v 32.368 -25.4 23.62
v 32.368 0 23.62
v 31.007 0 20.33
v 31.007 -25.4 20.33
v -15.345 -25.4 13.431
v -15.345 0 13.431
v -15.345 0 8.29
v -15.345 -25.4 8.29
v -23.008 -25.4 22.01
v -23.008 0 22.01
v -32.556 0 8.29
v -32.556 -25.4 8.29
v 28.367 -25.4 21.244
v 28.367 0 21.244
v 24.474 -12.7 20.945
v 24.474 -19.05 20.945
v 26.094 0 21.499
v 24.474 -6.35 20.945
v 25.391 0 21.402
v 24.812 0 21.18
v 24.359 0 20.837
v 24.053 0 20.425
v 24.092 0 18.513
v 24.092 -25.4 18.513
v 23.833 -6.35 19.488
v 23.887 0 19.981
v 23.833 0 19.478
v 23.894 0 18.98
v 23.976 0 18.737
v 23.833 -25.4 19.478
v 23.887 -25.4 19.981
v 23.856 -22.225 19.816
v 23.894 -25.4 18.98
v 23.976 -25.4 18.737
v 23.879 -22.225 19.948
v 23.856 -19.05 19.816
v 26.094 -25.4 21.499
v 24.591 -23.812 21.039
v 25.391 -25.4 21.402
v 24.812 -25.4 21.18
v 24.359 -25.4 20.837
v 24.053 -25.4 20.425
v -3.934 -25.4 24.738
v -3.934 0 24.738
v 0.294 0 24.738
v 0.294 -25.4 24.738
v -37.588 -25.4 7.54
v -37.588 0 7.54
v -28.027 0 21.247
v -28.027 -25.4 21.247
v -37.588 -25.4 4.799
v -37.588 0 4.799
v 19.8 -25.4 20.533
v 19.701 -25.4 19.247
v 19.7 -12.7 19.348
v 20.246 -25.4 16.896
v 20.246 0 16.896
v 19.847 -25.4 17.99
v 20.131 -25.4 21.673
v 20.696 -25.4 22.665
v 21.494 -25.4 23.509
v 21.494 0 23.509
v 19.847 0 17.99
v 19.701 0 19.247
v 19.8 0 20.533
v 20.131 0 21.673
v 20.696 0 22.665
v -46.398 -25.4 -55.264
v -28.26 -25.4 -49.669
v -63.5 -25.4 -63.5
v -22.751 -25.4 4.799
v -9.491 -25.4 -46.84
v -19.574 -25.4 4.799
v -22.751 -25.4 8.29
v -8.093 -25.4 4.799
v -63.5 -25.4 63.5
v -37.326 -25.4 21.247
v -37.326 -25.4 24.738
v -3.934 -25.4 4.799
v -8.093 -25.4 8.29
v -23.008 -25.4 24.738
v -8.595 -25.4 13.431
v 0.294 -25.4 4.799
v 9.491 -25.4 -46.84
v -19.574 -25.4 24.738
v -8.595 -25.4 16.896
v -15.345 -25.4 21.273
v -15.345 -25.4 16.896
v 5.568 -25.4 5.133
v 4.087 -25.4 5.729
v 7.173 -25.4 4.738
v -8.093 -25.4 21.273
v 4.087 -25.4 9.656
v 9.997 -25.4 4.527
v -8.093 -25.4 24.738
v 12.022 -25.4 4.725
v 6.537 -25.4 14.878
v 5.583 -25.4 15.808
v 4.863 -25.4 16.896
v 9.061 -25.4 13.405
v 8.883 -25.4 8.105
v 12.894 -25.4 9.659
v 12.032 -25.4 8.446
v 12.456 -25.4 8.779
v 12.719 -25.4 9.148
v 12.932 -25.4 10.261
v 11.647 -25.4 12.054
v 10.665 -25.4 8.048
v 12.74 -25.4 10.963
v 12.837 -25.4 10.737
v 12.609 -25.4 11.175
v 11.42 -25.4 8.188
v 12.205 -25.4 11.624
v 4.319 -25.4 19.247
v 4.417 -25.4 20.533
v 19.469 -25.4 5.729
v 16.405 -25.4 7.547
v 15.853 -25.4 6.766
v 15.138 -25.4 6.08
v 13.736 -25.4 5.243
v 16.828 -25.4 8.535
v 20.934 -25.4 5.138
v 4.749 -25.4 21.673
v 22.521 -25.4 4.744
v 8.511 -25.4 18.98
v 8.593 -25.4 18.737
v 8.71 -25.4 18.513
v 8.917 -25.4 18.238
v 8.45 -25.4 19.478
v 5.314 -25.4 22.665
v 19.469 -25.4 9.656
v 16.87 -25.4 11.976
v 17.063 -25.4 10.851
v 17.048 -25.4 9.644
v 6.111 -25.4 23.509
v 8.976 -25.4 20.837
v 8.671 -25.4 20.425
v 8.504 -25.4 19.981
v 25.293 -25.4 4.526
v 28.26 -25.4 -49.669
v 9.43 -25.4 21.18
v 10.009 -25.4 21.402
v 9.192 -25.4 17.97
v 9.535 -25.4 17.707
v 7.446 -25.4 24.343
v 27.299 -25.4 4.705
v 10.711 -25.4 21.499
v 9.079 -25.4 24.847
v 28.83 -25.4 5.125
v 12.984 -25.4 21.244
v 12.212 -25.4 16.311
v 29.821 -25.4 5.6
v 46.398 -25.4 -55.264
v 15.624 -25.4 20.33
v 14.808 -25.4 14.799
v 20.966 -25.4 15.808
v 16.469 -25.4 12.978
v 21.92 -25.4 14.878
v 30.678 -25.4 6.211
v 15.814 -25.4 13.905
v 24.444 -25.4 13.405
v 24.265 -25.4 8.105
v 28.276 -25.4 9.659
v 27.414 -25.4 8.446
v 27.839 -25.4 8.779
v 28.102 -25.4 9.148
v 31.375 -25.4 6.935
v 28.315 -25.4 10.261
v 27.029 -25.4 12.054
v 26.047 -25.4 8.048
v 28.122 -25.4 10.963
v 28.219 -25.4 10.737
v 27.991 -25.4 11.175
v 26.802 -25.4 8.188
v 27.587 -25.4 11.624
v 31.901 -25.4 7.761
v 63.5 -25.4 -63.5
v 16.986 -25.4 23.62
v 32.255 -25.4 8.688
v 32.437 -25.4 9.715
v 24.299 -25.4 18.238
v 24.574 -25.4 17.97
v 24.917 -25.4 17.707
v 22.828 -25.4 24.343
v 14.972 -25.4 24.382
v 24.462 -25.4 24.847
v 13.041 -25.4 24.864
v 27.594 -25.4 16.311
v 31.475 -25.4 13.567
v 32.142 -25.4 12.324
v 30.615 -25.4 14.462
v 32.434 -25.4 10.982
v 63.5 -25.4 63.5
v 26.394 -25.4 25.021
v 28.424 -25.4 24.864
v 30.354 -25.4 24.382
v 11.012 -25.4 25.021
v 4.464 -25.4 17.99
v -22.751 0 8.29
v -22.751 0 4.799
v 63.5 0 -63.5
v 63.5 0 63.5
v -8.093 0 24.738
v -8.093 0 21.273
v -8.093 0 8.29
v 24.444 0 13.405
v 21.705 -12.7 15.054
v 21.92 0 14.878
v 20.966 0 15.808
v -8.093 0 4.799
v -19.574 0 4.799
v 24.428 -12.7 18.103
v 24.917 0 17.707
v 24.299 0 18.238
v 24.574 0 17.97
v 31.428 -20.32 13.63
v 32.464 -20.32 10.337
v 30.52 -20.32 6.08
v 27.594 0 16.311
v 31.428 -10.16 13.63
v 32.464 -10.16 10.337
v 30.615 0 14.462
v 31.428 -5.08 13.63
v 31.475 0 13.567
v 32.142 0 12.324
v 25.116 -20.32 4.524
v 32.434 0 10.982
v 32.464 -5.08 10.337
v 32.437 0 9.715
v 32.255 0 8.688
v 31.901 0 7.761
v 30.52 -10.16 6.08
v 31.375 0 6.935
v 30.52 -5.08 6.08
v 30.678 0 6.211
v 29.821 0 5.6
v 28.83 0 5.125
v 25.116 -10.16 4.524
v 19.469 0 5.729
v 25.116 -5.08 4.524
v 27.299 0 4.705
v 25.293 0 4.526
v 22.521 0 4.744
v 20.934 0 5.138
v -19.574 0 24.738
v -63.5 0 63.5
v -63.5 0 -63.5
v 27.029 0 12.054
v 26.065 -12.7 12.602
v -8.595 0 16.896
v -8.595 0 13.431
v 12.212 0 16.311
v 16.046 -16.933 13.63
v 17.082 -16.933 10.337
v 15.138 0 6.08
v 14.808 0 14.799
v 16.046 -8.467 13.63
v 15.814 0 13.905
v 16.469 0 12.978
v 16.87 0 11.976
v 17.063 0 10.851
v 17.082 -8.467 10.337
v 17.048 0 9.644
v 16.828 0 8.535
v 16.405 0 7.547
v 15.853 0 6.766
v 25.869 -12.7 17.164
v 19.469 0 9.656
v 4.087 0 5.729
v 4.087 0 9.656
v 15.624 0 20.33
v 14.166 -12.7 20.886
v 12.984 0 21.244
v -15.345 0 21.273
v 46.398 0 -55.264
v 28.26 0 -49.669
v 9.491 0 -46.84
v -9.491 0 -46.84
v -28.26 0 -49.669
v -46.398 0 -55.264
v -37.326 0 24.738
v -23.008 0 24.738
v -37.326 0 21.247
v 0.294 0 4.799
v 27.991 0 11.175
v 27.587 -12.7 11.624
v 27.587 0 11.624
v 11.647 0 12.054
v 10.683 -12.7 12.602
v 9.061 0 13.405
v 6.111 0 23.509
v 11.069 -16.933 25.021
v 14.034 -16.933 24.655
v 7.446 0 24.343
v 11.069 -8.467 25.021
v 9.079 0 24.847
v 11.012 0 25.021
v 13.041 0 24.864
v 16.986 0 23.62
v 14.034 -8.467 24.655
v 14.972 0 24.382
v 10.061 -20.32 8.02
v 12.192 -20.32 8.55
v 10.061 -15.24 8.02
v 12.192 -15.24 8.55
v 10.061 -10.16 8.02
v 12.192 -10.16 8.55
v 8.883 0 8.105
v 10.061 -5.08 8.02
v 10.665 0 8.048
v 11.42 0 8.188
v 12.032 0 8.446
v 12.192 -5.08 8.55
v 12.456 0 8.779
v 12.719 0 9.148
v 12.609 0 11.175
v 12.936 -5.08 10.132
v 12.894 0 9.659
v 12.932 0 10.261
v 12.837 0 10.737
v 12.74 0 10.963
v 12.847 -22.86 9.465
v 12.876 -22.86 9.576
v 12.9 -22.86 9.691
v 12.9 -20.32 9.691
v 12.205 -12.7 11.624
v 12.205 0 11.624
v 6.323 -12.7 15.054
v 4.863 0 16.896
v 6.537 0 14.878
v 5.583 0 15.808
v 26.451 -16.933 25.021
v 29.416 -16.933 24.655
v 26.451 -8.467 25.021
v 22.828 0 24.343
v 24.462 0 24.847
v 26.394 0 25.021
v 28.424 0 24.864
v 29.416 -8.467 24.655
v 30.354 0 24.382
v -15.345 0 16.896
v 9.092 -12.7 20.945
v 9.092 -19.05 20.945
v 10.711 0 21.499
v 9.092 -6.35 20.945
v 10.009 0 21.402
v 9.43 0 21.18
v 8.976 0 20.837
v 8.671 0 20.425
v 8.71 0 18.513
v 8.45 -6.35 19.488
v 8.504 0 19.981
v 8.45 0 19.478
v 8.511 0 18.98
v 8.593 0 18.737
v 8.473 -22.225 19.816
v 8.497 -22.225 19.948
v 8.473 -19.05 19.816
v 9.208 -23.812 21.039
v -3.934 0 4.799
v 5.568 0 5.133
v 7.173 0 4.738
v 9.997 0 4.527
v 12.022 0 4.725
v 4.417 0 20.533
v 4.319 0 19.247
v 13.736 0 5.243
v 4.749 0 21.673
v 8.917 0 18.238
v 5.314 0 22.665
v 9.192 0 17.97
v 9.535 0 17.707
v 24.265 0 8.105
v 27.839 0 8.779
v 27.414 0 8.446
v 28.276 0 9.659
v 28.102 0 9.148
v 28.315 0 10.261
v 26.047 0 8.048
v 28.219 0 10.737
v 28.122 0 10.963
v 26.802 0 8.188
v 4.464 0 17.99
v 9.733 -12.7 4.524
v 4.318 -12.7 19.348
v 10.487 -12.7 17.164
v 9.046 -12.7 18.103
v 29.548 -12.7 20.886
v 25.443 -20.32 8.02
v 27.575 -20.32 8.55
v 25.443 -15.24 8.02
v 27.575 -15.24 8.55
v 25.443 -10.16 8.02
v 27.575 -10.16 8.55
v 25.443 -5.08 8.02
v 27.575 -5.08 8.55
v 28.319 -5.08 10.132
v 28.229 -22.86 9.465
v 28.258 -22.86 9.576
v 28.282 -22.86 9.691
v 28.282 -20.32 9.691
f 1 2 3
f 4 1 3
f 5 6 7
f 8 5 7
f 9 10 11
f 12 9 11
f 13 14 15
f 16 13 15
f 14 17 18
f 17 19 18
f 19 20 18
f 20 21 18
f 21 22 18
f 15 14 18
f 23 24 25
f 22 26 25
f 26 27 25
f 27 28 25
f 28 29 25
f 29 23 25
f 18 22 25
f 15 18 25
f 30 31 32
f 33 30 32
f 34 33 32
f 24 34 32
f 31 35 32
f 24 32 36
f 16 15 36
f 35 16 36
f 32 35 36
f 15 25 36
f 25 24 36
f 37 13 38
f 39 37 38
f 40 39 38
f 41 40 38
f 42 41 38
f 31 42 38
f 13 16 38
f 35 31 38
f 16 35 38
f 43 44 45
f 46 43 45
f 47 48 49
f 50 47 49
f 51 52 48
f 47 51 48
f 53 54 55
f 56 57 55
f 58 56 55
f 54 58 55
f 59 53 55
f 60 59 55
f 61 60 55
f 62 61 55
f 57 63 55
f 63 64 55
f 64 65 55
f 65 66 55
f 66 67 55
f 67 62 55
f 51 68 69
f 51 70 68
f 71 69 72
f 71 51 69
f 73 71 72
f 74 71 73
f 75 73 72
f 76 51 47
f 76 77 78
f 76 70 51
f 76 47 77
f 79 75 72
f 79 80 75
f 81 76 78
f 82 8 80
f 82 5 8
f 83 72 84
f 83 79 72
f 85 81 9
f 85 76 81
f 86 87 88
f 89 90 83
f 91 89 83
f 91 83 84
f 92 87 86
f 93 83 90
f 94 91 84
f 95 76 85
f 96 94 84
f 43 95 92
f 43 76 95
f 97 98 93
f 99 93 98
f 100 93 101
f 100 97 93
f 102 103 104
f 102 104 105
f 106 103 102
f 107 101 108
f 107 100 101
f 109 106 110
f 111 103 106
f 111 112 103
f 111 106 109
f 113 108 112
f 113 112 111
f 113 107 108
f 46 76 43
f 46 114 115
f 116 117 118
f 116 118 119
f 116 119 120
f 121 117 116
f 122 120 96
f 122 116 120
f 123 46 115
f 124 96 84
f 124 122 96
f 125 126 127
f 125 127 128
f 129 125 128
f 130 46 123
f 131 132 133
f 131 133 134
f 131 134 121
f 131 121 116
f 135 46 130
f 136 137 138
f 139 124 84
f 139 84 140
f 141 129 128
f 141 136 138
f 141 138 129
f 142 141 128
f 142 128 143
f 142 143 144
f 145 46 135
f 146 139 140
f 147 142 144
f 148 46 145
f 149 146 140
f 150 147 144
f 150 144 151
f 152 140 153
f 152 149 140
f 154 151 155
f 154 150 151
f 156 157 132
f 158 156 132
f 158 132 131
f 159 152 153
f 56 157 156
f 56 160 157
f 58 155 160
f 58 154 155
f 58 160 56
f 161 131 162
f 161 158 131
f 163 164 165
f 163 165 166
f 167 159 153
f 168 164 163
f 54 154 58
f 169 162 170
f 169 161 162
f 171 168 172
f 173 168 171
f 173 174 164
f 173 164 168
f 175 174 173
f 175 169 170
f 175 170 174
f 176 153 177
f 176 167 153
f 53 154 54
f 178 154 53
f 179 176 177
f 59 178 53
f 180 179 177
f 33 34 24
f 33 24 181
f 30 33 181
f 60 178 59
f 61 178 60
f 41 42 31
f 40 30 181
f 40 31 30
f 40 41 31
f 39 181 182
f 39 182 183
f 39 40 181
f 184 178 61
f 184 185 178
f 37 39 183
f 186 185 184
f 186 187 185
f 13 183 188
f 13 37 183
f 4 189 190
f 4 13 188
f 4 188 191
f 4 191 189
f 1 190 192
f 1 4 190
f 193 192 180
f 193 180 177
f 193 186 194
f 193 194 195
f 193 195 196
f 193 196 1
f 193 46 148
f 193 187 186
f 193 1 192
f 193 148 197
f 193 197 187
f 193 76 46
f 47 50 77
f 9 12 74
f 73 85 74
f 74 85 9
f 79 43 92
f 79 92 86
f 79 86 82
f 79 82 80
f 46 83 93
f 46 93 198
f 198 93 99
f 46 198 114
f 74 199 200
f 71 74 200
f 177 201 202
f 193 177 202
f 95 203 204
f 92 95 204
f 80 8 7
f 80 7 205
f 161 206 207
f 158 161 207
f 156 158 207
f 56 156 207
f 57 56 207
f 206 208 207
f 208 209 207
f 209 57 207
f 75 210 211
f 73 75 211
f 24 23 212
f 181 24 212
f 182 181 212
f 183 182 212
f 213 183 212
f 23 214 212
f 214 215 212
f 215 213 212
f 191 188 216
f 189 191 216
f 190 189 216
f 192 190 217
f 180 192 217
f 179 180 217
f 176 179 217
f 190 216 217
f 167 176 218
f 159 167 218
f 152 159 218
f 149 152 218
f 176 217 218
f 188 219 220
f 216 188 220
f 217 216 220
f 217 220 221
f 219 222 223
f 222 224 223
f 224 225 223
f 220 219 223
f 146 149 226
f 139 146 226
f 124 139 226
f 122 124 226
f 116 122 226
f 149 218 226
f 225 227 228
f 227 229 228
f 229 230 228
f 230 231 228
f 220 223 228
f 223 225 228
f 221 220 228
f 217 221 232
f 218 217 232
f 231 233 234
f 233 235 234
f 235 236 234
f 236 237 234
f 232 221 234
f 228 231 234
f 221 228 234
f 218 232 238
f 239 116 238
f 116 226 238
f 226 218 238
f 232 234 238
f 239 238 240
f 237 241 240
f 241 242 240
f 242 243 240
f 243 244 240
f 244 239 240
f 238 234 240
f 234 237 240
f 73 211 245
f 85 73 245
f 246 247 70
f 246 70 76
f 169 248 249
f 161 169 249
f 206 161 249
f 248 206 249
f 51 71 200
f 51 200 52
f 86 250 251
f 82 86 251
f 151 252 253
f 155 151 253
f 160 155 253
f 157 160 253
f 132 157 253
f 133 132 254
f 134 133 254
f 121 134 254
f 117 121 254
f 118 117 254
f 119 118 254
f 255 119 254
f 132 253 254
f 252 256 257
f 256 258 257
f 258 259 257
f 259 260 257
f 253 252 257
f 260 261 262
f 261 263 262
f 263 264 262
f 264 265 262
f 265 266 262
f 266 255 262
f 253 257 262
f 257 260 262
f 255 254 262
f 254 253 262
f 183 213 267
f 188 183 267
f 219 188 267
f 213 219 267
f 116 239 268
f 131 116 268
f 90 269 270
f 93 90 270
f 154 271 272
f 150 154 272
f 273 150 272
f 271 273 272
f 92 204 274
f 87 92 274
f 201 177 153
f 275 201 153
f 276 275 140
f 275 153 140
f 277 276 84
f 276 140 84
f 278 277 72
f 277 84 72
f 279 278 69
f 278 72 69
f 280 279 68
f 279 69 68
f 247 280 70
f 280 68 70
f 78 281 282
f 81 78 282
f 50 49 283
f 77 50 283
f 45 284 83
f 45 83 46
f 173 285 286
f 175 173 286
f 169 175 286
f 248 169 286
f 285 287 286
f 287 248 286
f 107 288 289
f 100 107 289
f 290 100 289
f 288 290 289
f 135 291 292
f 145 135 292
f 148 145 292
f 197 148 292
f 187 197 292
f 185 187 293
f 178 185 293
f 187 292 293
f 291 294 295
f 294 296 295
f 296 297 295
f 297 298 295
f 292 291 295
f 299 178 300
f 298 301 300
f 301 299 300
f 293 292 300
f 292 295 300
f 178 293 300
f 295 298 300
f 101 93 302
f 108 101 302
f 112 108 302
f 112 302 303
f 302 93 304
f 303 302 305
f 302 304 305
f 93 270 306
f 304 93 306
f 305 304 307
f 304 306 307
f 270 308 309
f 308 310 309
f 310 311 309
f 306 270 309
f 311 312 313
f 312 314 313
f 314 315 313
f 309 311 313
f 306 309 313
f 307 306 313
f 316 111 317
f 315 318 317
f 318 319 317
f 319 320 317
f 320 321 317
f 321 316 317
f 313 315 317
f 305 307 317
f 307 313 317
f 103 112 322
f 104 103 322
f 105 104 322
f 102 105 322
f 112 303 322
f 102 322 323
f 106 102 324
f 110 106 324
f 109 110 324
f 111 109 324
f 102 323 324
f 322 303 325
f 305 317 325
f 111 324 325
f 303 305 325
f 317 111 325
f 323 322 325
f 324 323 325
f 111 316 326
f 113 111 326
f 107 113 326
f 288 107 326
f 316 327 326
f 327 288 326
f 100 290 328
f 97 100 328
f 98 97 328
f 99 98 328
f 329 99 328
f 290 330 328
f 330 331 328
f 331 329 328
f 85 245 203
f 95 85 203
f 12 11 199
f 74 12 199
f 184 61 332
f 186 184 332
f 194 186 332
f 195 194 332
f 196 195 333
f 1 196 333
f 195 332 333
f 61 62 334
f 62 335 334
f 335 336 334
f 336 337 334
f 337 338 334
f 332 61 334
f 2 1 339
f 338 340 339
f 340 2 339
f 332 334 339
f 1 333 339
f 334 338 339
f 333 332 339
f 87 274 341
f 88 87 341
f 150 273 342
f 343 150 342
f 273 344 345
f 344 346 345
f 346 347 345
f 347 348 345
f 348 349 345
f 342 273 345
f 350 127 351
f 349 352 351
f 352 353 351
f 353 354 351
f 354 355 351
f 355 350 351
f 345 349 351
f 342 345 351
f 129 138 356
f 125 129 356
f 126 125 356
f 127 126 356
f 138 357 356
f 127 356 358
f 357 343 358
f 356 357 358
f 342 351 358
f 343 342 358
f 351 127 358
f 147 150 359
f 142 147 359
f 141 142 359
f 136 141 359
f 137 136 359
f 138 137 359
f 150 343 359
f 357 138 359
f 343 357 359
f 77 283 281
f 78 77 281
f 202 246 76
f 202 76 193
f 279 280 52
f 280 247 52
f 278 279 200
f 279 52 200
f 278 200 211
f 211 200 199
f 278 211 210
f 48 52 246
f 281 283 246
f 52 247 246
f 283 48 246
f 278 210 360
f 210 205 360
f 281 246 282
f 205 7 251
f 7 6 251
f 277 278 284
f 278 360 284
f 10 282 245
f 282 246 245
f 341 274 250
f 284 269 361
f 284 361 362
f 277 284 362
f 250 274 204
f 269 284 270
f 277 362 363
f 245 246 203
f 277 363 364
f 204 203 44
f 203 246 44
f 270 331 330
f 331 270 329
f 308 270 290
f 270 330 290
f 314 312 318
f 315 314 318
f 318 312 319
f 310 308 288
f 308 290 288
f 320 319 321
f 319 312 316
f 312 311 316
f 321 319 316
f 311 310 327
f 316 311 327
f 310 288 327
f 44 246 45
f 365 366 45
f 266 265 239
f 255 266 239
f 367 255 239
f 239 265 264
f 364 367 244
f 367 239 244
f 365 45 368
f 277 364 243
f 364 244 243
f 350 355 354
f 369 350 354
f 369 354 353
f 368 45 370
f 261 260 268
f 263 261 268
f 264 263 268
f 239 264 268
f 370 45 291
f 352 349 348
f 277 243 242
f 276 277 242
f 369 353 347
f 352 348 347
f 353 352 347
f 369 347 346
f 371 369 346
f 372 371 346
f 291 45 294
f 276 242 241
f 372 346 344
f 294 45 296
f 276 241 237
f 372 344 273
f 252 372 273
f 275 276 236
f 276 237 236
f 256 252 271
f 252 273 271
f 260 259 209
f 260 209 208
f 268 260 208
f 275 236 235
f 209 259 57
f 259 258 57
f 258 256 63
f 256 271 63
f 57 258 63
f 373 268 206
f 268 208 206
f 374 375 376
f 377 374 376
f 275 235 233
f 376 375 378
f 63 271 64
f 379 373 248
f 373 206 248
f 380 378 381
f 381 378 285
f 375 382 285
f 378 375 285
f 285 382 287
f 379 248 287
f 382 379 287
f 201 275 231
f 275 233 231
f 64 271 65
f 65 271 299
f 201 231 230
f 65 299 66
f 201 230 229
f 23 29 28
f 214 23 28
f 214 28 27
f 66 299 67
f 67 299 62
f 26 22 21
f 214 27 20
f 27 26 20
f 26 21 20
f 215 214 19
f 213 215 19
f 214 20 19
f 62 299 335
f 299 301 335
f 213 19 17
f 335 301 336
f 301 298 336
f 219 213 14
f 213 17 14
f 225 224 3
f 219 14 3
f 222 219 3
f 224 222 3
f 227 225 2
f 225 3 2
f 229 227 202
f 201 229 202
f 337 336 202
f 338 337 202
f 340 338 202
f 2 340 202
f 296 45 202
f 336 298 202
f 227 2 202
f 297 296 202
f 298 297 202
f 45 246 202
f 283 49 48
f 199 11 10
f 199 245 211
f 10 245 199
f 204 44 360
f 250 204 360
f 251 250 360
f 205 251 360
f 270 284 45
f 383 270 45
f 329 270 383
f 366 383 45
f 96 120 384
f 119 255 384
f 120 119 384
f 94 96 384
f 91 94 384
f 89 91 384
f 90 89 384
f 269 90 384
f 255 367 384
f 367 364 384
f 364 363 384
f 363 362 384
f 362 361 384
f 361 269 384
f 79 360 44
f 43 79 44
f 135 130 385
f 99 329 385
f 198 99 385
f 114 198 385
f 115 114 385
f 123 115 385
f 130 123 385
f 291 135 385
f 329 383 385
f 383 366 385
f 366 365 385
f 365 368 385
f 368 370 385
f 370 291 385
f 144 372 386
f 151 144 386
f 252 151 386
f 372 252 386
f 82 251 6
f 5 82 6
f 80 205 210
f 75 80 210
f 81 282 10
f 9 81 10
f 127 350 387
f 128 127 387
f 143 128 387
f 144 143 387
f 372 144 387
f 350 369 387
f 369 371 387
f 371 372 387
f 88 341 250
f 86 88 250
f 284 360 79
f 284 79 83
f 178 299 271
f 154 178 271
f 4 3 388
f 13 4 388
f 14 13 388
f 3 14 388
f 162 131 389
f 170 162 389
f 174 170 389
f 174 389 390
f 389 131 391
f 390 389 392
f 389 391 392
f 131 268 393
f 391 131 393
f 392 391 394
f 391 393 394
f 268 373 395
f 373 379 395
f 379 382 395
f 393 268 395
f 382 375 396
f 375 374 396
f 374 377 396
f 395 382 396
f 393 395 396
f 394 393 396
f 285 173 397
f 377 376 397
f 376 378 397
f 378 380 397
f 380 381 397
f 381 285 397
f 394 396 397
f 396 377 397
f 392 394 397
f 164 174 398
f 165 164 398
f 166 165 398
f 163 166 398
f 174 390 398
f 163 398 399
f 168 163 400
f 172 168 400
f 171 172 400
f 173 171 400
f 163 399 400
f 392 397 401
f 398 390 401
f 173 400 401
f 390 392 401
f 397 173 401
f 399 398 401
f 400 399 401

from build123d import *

# Parameters (mm, degrees)
F0_W     = 127
F0_H     = 127
F0_W_2   = 4.2285097079
F0_H_2   = 19.9381432976
F1_DEPTH = 25.4
F3_DEPTH = 25.4


with BuildPart() as f1:
    # F0 (on Front) → F1 (new body)
    with BuildSketch(Plane.XZ):
        Rectangle(F0_W, F0_H)
        Polygon((-22.7507378271, 8.2904180357), (-22.7507378271, 4.7993883491), (-37.5876139951, 4.7993883491), (-37.5876139951, 7.539846653), (-28.0265564409, 21.2465019601), (-37.3257867686, 21.2465019601), (-37.3257867686, 24.7375316467), (-23.0082012664, 24.7375316467), (-23.0082012664, 22.010164704), (-32.5561674593, 8.2904180357), align=None, mode=Mode.SUBTRACT)
        Polygon((-8.0927769304, 8.2904180357), (-8.0927769304, 4.7993883491), (-19.5739008122, 4.7993883491), (-19.5739008122, 24.7375316467), (-8.0927769304, 24.7375316467), (-8.0927769304, 21.2726846827), (-15.3453911043, 21.2726846827), (-15.3453911043, 16.8958062131), (-8.5946124479, 16.8958062131), (-8.5946124479, 13.4309592492), (-15.3453911043, 13.4309592492), (-15.3453911043, 8.2904180357), align=None, mode=Mode.SUBTRACT)
        with Locations((-1.8198329623, 14.7684599979)):
            Rectangle(F0_W_2, F0_H_2, mode=Mode.SUBTRACT)
        with BuildLine():
            add(Edge.make_bspline(
                [(16.0455114589, 13.6295115626), (17.0819108971, 12.2876470268), (17.0819108971, 10.3370341894)],
                knots=[0, 0, 0, 1, 1, 1], degree=2))
            add(Edge.make_bspline(
                [(17.0819108971, 10.3370341894), (17.0819108971, 7.6358499694), (15.1378437404, 6.0801598653)],
                knots=[0, 0, 0, 1, 1, 1], degree=2))
            add(Edge.make_bspline(
                [(15.1378437404, 6.0801598653), (13.1937765836, 4.5244697612), (9.7332934068, 4.5244697612)],
                knots=[0, 0, 0, 1, 1, 1], degree=2))
            add(Edge.make_bspline(
                [(9.7332934068, 4.5244697612), (6.5390012436, 4.5244697612), (4.0865528887, 5.7288750031)],
                knots=[0, 0, 0, 1, 1, 1], degree=2))
            Line((4.0865528887, 5.7288750031), (4.0865528887, 9.6562834005))
            add(Edge.make_bspline(
                [(4.0865528887, 9.6562834005), (6.1026225327, 8.7529794691), (7.5012163009, 8.386421352)],
                knots=[0, 0, 0, 1, 1, 1], degree=2))
            add(Edge.make_bspline(
                [(7.5012163009, 8.386421352), (8.8998100691, 8.0198632349), (10.0605774399, 8.0198632349)],
                knots=[0, 0, 0, 1, 1, 1], degree=2))
            add(Edge.make_bspline(
                [(10.0605774399, 8.0198632349), (11.4482617403, 8.0198632349), (12.1922874423, 8.5500633686)],
                knots=[0, 0, 0, 1, 1, 1], degree=2))
            add(Edge.make_bspline(
                [(12.1922874423, 8.5500633686), (12.9363131443, 9.0802635023), (12.9363131443, 10.1319361953)],
                knots=[0, 0, 0, 1, 1, 1], degree=2))
            add(Edge.make_bspline(
                [(12.9363131443, 10.1319361953), (12.9363131443, 10.7166836679), (12.6090291111, 11.1748813142)],
                knots=[0, 0, 0, 1, 1, 1], degree=2))
            add(Edge.make_bspline(
                [(12.6090291111, 11.1748813142), (12.281745078, 11.6330789606), (11.6468140538, 12.0541844165)],
                knots=[0, 0, 0, 1, 1, 1], degree=2))
            add(Edge.make_bspline(
                [(11.6468140538, 12.0541844165), (11.0118830295, 12.4752898725), (9.0612701921, 13.4047765265)],
                knots=[0, 0, 0, 1, 1, 1], degree=2))
            add(Edge.make_bspline(
                [(9.0612701921, 13.4047765265), (7.2372071809, 14.2644425869), (6.3229937817, 15.0542880535)],
                knots=[0, 0, 0, 1, 1, 1], degree=2))
            add(Edge.make_bspline(
                [(6.3229937817, 15.0542880535), (5.4087803825, 15.8441335201), (4.863306994, 16.8958062131)],
                knots=[0, 0, 0, 1, 1, 1], degree=2))
            add(Edge.make_bspline(
                [(4.863306994, 16.8958062131), (4.3178336055, 17.9474789062), (4.3178336055, 19.348254568)],
                knots=[0, 0, 0, 1, 1, 1], degree=2))
            add(Edge.make_bspline(
                [(4.3178336055, 19.348254568), (4.3178336055, 21.9970733427), (6.1113501069, 23.5091255757)],
                knots=[0, 0, 0, 1, 1, 1], degree=2))
            add(Edge.make_bspline(
                [(6.1113501069, 23.5091255757), (7.9048666084, 25.0211778087), (11.0686122619, 25.0211778087)],
                knots=[0, 0, 0, 1, 1, 1], degree=2))
            add(Edge.make_bspline(
                [(11.0686122619, 25.0211778087), (12.6221204725, 25.0211778087), (14.033805602, 24.6546196916)],
                knots=[0, 0, 0, 1, 1, 1], degree=2))
            add(Edge.make_bspline(
                [(14.033805602, 24.6546196916), (15.4454907315, 24.2880615745), (16.9859075807, 23.620402147)],
                knots=[0, 0, 0, 1, 1, 1], degree=2))
            Line((16.9859075807, 23.620402147), (15.6244060029, 20.3301066673))
            add(Edge.make_bspline(
                [(15.6244060029, 20.3301066673), (14.0272599213, 20.9846747336), (12.9843148025, 21.2443200665)],
                knots=[0, 0, 0, 1, 1, 1], degree=2))
            add(Edge.make_bspline(
                [(12.9843148025, 21.2443200665), (11.9413696836, 21.5039653995), (10.9333348616, 21.5039653995)],
                knots=[0, 0, 0, 1, 1, 1], degree=2))
            add(Edge.make_bspline(
                [(10.9333348616, 21.5039653995), (9.7332934068, 21.5039653995), (9.0918167019, 20.9454006496)],
                knots=[0, 0, 0, 1, 1, 1], degree=2))
            add(Edge.make_bspline(
                [(9.0918167019, 20.9454006496), (8.450339997, 20.3868358997), (8.450339997, 19.4878957554)],
                knots=[0, 0, 0, 1, 1, 1], degree=2))
            add(Edge.make_bspline(
                [(8.450339997, 19.4878957554), (8.450339997, 18.9293310056), (8.7099853299, 18.5125893368)],
                knots=[0, 0, 0, 1, 1, 1], degree=2))
            add(Edge.make_bspline(
                [(8.7099853299, 18.5125893368), (8.9696306629, 18.0958476679), (9.5347410934, 17.7074706153)],
                knots=[0, 0, 0, 1, 1, 1], degree=2))
            add(Edge.make_bspline(
                [(9.5347410934, 17.7074706153), (10.0998515239, 17.3190935626), (12.2119244843, 16.3110587406)],
                knots=[0, 0, 0, 1, 1, 1], degree=2))
            add(Edge.make_bspline(
                [(12.2119244843, 16.3110587406), (15.0091120207, 14.9713760984), (16.0455114589, 13.6295115626)],
                knots=[0, 0, 0, 1, 1, 1], degree=2))
        make_face(mode=Mode.SUBTRACT)
        with BuildLine():
            add(Edge.make_bspline(
                [(31.4278610155, 13.6295115626), (32.4642604537, 12.2876470268), (32.4642604537, 10.3370341894)],
                knots=[0, 0, 0, 1, 1, 1], degree=2))
            add(Edge.make_bspline(
                [(32.4642604537, 10.3370341894), (32.4642604537, 7.6358499694), (30.520193297, 6.0801598653)],
                knots=[0, 0, 0, 1, 1, 1], degree=2))
            add(Edge.make_bspline(
                [(30.520193297, 6.0801598653), (28.5761261403, 4.5244697612), (25.1156429634, 4.5244697612)],
                knots=[0, 0, 0, 1, 1, 1], degree=2))
            add(Edge.make_bspline(
                [(25.1156429634, 4.5244697612), (21.9213508002, 4.5244697612), (19.4689024453, 5.7288750031)],
                knots=[0, 0, 0, 1, 1, 1], degree=2))
            Line((19.4689024453, 5.7288750031), (19.4689024453, 9.6562834005))
            add(Edge.make_bspline(
                [(19.4689024453, 9.6562834005), (21.4849720893, 8.7529794691), (22.8835658575, 8.386421352)],
                knots=[0, 0, 0, 1, 1, 1], degree=2))
            add(Edge.make_bspline(
                [(22.8835658575, 8.386421352), (24.2821596257, 8.0198632349), (25.4429269965, 8.0198632349)],
                knots=[0, 0, 0, 1, 1, 1], degree=2))
            add(Edge.make_bspline(
                [(25.4429269965, 8.0198632349), (26.8306112969, 8.0198632349), (27.5746369989, 8.5500633686)],
                knots=[0, 0, 0, 1, 1, 1], degree=2))
            add(Edge.make_bspline(
                [(27.5746369989, 8.5500633686), (28.3186627009, 9.0802635023), (28.3186627009, 10.1319361953)],
                knots=[0, 0, 0, 1, 1, 1], degree=2))
            add(Edge.make_bspline(
                [(28.3186627009, 10.1319361953), (28.3186627009, 10.7166836679), (27.9913786677, 11.1748813142)],
                knots=[0, 0, 0, 1, 1, 1], degree=2))
            add(Edge.make_bspline(
                [(27.9913786677, 11.1748813142), (27.6640946346, 11.6330789606), (27.0291636104, 12.0541844165)],
                knots=[0, 0, 0, 1, 1, 1], degree=2))
            add(Edge.make_bspline(
                [(27.0291636104, 12.0541844165), (26.3942325861, 12.4752898725), (24.4436197487, 13.4047765265)],
                knots=[0, 0, 0, 1, 1, 1], degree=2))
            add(Edge.make_bspline(
                [(24.4436197487, 13.4047765265), (22.6195567375, 14.2644425869), (21.7053433383, 15.0542880535)],
                knots=[0, 0, 0, 1, 1, 1], degree=2))
            add(Edge.make_bspline(
                [(21.7053433383, 15.0542880535), (20.7911299391, 15.8441335201), (20.2456565506, 16.8958062131)],
                knots=[0, 0, 0, 1, 1, 1], degree=2))
            add(Edge.make_bspline(
                [(20.2456565506, 16.8958062131), (19.7001831621, 17.9474789062), (19.7001831621, 19.348254568)],
                knots=[0, 0, 0, 1, 1, 1], degree=2))
            add(Edge.make_bspline(
                [(19.7001831621, 19.348254568), (19.7001831621, 21.9970733427), (21.4936996636, 23.5091255757)],
                knots=[0, 0, 0, 1, 1, 1], degree=2))
            add(Edge.make_bspline(
                [(21.4936996636, 23.5091255757), (23.287216165, 25.0211778087), (26.4509618185, 25.0211778087)],
                knots=[0, 0, 0, 1, 1, 1], degree=2))
            add(Edge.make_bspline(
                [(26.4509618185, 25.0211778087), (28.0044700291, 25.0211778087), (29.4161551586, 24.6546196916)],
                knots=[0, 0, 0, 1, 1, 1], degree=2))
            add(Edge.make_bspline(
                [(29.4161551586, 24.6546196916), (30.8278402881, 24.2880615745), (32.3682571373, 23.620402147)],
                knots=[0, 0, 0, 1, 1, 1], degree=2))
            Line((32.3682571373, 23.620402147), (31.0067555595, 20.3301066673))
            add(Edge.make_bspline(
                [(31.0067555595, 20.3301066673), (29.4096094779, 20.9846747336), (28.3666643591, 21.2443200665)],
                knots=[0, 0, 0, 1, 1, 1], degree=2))
            add(Edge.make_bspline(
                [(28.3666643591, 21.2443200665), (27.3237192402, 21.5039653995), (26.3156844182, 21.5039653995)],
                knots=[0, 0, 0, 1, 1, 1], degree=2))
            add(Edge.make_bspline(
                [(26.3156844182, 21.5039653995), (25.1156429634, 21.5039653995), (24.4741662585, 20.9454006496)],
                knots=[0, 0, 0, 1, 1, 1], degree=2))
            add(Edge.make_bspline(
                [(24.4741662585, 20.9454006496), (23.8326895536, 20.3868358997), (23.8326895536, 19.4878957554)],
                knots=[0, 0, 0, 1, 1, 1], degree=2))
            add(Edge.make_bspline(
                [(23.8326895536, 19.4878957554), (23.8326895536, 18.9293310056), (24.0923348865, 18.5125893368)],
                knots=[0, 0, 0, 1, 1, 1], degree=2))
            add(Edge.make_bspline(
                [(24.0923348865, 18.5125893368), (24.3519802195, 18.0958476679), (24.91709065, 17.7074706153)],
                knots=[0, 0, 0, 1, 1, 1], degree=2))
            add(Edge.make_bspline(
                [(24.91709065, 17.7074706153), (25.4822010805, 17.3190935626), (27.5942740409, 16.3110587406)],
                knots=[0, 0, 0, 1, 1, 1], degree=2))
            add(Edge.make_bspline(
                [(27.5942740409, 16.3110587406), (30.3914615773, 14.9713760984), (31.4278610155, 13.6295115626)],
                knots=[0, 0, 0, 1, 1, 1], degree=2))
        make_face(mode=Mode.SUBTRACT)
    extrude(amount=F1_DEPTH)

    # F2 (on face) → F3 (cut)
    with BuildSketch(Plane.XZ.offset(25.4)):
        with BuildLine():
            Line((-63.5, -63.5), (63.5, -63.5))
            ThreePointArc((63.5, -63.5), (0, -46.4852262806), (-63.5, -63.5))
        make_face()
    extrude(amount=-F3_DEPTH, mode=Mode.SUBTRACT)


solid = f1.part
